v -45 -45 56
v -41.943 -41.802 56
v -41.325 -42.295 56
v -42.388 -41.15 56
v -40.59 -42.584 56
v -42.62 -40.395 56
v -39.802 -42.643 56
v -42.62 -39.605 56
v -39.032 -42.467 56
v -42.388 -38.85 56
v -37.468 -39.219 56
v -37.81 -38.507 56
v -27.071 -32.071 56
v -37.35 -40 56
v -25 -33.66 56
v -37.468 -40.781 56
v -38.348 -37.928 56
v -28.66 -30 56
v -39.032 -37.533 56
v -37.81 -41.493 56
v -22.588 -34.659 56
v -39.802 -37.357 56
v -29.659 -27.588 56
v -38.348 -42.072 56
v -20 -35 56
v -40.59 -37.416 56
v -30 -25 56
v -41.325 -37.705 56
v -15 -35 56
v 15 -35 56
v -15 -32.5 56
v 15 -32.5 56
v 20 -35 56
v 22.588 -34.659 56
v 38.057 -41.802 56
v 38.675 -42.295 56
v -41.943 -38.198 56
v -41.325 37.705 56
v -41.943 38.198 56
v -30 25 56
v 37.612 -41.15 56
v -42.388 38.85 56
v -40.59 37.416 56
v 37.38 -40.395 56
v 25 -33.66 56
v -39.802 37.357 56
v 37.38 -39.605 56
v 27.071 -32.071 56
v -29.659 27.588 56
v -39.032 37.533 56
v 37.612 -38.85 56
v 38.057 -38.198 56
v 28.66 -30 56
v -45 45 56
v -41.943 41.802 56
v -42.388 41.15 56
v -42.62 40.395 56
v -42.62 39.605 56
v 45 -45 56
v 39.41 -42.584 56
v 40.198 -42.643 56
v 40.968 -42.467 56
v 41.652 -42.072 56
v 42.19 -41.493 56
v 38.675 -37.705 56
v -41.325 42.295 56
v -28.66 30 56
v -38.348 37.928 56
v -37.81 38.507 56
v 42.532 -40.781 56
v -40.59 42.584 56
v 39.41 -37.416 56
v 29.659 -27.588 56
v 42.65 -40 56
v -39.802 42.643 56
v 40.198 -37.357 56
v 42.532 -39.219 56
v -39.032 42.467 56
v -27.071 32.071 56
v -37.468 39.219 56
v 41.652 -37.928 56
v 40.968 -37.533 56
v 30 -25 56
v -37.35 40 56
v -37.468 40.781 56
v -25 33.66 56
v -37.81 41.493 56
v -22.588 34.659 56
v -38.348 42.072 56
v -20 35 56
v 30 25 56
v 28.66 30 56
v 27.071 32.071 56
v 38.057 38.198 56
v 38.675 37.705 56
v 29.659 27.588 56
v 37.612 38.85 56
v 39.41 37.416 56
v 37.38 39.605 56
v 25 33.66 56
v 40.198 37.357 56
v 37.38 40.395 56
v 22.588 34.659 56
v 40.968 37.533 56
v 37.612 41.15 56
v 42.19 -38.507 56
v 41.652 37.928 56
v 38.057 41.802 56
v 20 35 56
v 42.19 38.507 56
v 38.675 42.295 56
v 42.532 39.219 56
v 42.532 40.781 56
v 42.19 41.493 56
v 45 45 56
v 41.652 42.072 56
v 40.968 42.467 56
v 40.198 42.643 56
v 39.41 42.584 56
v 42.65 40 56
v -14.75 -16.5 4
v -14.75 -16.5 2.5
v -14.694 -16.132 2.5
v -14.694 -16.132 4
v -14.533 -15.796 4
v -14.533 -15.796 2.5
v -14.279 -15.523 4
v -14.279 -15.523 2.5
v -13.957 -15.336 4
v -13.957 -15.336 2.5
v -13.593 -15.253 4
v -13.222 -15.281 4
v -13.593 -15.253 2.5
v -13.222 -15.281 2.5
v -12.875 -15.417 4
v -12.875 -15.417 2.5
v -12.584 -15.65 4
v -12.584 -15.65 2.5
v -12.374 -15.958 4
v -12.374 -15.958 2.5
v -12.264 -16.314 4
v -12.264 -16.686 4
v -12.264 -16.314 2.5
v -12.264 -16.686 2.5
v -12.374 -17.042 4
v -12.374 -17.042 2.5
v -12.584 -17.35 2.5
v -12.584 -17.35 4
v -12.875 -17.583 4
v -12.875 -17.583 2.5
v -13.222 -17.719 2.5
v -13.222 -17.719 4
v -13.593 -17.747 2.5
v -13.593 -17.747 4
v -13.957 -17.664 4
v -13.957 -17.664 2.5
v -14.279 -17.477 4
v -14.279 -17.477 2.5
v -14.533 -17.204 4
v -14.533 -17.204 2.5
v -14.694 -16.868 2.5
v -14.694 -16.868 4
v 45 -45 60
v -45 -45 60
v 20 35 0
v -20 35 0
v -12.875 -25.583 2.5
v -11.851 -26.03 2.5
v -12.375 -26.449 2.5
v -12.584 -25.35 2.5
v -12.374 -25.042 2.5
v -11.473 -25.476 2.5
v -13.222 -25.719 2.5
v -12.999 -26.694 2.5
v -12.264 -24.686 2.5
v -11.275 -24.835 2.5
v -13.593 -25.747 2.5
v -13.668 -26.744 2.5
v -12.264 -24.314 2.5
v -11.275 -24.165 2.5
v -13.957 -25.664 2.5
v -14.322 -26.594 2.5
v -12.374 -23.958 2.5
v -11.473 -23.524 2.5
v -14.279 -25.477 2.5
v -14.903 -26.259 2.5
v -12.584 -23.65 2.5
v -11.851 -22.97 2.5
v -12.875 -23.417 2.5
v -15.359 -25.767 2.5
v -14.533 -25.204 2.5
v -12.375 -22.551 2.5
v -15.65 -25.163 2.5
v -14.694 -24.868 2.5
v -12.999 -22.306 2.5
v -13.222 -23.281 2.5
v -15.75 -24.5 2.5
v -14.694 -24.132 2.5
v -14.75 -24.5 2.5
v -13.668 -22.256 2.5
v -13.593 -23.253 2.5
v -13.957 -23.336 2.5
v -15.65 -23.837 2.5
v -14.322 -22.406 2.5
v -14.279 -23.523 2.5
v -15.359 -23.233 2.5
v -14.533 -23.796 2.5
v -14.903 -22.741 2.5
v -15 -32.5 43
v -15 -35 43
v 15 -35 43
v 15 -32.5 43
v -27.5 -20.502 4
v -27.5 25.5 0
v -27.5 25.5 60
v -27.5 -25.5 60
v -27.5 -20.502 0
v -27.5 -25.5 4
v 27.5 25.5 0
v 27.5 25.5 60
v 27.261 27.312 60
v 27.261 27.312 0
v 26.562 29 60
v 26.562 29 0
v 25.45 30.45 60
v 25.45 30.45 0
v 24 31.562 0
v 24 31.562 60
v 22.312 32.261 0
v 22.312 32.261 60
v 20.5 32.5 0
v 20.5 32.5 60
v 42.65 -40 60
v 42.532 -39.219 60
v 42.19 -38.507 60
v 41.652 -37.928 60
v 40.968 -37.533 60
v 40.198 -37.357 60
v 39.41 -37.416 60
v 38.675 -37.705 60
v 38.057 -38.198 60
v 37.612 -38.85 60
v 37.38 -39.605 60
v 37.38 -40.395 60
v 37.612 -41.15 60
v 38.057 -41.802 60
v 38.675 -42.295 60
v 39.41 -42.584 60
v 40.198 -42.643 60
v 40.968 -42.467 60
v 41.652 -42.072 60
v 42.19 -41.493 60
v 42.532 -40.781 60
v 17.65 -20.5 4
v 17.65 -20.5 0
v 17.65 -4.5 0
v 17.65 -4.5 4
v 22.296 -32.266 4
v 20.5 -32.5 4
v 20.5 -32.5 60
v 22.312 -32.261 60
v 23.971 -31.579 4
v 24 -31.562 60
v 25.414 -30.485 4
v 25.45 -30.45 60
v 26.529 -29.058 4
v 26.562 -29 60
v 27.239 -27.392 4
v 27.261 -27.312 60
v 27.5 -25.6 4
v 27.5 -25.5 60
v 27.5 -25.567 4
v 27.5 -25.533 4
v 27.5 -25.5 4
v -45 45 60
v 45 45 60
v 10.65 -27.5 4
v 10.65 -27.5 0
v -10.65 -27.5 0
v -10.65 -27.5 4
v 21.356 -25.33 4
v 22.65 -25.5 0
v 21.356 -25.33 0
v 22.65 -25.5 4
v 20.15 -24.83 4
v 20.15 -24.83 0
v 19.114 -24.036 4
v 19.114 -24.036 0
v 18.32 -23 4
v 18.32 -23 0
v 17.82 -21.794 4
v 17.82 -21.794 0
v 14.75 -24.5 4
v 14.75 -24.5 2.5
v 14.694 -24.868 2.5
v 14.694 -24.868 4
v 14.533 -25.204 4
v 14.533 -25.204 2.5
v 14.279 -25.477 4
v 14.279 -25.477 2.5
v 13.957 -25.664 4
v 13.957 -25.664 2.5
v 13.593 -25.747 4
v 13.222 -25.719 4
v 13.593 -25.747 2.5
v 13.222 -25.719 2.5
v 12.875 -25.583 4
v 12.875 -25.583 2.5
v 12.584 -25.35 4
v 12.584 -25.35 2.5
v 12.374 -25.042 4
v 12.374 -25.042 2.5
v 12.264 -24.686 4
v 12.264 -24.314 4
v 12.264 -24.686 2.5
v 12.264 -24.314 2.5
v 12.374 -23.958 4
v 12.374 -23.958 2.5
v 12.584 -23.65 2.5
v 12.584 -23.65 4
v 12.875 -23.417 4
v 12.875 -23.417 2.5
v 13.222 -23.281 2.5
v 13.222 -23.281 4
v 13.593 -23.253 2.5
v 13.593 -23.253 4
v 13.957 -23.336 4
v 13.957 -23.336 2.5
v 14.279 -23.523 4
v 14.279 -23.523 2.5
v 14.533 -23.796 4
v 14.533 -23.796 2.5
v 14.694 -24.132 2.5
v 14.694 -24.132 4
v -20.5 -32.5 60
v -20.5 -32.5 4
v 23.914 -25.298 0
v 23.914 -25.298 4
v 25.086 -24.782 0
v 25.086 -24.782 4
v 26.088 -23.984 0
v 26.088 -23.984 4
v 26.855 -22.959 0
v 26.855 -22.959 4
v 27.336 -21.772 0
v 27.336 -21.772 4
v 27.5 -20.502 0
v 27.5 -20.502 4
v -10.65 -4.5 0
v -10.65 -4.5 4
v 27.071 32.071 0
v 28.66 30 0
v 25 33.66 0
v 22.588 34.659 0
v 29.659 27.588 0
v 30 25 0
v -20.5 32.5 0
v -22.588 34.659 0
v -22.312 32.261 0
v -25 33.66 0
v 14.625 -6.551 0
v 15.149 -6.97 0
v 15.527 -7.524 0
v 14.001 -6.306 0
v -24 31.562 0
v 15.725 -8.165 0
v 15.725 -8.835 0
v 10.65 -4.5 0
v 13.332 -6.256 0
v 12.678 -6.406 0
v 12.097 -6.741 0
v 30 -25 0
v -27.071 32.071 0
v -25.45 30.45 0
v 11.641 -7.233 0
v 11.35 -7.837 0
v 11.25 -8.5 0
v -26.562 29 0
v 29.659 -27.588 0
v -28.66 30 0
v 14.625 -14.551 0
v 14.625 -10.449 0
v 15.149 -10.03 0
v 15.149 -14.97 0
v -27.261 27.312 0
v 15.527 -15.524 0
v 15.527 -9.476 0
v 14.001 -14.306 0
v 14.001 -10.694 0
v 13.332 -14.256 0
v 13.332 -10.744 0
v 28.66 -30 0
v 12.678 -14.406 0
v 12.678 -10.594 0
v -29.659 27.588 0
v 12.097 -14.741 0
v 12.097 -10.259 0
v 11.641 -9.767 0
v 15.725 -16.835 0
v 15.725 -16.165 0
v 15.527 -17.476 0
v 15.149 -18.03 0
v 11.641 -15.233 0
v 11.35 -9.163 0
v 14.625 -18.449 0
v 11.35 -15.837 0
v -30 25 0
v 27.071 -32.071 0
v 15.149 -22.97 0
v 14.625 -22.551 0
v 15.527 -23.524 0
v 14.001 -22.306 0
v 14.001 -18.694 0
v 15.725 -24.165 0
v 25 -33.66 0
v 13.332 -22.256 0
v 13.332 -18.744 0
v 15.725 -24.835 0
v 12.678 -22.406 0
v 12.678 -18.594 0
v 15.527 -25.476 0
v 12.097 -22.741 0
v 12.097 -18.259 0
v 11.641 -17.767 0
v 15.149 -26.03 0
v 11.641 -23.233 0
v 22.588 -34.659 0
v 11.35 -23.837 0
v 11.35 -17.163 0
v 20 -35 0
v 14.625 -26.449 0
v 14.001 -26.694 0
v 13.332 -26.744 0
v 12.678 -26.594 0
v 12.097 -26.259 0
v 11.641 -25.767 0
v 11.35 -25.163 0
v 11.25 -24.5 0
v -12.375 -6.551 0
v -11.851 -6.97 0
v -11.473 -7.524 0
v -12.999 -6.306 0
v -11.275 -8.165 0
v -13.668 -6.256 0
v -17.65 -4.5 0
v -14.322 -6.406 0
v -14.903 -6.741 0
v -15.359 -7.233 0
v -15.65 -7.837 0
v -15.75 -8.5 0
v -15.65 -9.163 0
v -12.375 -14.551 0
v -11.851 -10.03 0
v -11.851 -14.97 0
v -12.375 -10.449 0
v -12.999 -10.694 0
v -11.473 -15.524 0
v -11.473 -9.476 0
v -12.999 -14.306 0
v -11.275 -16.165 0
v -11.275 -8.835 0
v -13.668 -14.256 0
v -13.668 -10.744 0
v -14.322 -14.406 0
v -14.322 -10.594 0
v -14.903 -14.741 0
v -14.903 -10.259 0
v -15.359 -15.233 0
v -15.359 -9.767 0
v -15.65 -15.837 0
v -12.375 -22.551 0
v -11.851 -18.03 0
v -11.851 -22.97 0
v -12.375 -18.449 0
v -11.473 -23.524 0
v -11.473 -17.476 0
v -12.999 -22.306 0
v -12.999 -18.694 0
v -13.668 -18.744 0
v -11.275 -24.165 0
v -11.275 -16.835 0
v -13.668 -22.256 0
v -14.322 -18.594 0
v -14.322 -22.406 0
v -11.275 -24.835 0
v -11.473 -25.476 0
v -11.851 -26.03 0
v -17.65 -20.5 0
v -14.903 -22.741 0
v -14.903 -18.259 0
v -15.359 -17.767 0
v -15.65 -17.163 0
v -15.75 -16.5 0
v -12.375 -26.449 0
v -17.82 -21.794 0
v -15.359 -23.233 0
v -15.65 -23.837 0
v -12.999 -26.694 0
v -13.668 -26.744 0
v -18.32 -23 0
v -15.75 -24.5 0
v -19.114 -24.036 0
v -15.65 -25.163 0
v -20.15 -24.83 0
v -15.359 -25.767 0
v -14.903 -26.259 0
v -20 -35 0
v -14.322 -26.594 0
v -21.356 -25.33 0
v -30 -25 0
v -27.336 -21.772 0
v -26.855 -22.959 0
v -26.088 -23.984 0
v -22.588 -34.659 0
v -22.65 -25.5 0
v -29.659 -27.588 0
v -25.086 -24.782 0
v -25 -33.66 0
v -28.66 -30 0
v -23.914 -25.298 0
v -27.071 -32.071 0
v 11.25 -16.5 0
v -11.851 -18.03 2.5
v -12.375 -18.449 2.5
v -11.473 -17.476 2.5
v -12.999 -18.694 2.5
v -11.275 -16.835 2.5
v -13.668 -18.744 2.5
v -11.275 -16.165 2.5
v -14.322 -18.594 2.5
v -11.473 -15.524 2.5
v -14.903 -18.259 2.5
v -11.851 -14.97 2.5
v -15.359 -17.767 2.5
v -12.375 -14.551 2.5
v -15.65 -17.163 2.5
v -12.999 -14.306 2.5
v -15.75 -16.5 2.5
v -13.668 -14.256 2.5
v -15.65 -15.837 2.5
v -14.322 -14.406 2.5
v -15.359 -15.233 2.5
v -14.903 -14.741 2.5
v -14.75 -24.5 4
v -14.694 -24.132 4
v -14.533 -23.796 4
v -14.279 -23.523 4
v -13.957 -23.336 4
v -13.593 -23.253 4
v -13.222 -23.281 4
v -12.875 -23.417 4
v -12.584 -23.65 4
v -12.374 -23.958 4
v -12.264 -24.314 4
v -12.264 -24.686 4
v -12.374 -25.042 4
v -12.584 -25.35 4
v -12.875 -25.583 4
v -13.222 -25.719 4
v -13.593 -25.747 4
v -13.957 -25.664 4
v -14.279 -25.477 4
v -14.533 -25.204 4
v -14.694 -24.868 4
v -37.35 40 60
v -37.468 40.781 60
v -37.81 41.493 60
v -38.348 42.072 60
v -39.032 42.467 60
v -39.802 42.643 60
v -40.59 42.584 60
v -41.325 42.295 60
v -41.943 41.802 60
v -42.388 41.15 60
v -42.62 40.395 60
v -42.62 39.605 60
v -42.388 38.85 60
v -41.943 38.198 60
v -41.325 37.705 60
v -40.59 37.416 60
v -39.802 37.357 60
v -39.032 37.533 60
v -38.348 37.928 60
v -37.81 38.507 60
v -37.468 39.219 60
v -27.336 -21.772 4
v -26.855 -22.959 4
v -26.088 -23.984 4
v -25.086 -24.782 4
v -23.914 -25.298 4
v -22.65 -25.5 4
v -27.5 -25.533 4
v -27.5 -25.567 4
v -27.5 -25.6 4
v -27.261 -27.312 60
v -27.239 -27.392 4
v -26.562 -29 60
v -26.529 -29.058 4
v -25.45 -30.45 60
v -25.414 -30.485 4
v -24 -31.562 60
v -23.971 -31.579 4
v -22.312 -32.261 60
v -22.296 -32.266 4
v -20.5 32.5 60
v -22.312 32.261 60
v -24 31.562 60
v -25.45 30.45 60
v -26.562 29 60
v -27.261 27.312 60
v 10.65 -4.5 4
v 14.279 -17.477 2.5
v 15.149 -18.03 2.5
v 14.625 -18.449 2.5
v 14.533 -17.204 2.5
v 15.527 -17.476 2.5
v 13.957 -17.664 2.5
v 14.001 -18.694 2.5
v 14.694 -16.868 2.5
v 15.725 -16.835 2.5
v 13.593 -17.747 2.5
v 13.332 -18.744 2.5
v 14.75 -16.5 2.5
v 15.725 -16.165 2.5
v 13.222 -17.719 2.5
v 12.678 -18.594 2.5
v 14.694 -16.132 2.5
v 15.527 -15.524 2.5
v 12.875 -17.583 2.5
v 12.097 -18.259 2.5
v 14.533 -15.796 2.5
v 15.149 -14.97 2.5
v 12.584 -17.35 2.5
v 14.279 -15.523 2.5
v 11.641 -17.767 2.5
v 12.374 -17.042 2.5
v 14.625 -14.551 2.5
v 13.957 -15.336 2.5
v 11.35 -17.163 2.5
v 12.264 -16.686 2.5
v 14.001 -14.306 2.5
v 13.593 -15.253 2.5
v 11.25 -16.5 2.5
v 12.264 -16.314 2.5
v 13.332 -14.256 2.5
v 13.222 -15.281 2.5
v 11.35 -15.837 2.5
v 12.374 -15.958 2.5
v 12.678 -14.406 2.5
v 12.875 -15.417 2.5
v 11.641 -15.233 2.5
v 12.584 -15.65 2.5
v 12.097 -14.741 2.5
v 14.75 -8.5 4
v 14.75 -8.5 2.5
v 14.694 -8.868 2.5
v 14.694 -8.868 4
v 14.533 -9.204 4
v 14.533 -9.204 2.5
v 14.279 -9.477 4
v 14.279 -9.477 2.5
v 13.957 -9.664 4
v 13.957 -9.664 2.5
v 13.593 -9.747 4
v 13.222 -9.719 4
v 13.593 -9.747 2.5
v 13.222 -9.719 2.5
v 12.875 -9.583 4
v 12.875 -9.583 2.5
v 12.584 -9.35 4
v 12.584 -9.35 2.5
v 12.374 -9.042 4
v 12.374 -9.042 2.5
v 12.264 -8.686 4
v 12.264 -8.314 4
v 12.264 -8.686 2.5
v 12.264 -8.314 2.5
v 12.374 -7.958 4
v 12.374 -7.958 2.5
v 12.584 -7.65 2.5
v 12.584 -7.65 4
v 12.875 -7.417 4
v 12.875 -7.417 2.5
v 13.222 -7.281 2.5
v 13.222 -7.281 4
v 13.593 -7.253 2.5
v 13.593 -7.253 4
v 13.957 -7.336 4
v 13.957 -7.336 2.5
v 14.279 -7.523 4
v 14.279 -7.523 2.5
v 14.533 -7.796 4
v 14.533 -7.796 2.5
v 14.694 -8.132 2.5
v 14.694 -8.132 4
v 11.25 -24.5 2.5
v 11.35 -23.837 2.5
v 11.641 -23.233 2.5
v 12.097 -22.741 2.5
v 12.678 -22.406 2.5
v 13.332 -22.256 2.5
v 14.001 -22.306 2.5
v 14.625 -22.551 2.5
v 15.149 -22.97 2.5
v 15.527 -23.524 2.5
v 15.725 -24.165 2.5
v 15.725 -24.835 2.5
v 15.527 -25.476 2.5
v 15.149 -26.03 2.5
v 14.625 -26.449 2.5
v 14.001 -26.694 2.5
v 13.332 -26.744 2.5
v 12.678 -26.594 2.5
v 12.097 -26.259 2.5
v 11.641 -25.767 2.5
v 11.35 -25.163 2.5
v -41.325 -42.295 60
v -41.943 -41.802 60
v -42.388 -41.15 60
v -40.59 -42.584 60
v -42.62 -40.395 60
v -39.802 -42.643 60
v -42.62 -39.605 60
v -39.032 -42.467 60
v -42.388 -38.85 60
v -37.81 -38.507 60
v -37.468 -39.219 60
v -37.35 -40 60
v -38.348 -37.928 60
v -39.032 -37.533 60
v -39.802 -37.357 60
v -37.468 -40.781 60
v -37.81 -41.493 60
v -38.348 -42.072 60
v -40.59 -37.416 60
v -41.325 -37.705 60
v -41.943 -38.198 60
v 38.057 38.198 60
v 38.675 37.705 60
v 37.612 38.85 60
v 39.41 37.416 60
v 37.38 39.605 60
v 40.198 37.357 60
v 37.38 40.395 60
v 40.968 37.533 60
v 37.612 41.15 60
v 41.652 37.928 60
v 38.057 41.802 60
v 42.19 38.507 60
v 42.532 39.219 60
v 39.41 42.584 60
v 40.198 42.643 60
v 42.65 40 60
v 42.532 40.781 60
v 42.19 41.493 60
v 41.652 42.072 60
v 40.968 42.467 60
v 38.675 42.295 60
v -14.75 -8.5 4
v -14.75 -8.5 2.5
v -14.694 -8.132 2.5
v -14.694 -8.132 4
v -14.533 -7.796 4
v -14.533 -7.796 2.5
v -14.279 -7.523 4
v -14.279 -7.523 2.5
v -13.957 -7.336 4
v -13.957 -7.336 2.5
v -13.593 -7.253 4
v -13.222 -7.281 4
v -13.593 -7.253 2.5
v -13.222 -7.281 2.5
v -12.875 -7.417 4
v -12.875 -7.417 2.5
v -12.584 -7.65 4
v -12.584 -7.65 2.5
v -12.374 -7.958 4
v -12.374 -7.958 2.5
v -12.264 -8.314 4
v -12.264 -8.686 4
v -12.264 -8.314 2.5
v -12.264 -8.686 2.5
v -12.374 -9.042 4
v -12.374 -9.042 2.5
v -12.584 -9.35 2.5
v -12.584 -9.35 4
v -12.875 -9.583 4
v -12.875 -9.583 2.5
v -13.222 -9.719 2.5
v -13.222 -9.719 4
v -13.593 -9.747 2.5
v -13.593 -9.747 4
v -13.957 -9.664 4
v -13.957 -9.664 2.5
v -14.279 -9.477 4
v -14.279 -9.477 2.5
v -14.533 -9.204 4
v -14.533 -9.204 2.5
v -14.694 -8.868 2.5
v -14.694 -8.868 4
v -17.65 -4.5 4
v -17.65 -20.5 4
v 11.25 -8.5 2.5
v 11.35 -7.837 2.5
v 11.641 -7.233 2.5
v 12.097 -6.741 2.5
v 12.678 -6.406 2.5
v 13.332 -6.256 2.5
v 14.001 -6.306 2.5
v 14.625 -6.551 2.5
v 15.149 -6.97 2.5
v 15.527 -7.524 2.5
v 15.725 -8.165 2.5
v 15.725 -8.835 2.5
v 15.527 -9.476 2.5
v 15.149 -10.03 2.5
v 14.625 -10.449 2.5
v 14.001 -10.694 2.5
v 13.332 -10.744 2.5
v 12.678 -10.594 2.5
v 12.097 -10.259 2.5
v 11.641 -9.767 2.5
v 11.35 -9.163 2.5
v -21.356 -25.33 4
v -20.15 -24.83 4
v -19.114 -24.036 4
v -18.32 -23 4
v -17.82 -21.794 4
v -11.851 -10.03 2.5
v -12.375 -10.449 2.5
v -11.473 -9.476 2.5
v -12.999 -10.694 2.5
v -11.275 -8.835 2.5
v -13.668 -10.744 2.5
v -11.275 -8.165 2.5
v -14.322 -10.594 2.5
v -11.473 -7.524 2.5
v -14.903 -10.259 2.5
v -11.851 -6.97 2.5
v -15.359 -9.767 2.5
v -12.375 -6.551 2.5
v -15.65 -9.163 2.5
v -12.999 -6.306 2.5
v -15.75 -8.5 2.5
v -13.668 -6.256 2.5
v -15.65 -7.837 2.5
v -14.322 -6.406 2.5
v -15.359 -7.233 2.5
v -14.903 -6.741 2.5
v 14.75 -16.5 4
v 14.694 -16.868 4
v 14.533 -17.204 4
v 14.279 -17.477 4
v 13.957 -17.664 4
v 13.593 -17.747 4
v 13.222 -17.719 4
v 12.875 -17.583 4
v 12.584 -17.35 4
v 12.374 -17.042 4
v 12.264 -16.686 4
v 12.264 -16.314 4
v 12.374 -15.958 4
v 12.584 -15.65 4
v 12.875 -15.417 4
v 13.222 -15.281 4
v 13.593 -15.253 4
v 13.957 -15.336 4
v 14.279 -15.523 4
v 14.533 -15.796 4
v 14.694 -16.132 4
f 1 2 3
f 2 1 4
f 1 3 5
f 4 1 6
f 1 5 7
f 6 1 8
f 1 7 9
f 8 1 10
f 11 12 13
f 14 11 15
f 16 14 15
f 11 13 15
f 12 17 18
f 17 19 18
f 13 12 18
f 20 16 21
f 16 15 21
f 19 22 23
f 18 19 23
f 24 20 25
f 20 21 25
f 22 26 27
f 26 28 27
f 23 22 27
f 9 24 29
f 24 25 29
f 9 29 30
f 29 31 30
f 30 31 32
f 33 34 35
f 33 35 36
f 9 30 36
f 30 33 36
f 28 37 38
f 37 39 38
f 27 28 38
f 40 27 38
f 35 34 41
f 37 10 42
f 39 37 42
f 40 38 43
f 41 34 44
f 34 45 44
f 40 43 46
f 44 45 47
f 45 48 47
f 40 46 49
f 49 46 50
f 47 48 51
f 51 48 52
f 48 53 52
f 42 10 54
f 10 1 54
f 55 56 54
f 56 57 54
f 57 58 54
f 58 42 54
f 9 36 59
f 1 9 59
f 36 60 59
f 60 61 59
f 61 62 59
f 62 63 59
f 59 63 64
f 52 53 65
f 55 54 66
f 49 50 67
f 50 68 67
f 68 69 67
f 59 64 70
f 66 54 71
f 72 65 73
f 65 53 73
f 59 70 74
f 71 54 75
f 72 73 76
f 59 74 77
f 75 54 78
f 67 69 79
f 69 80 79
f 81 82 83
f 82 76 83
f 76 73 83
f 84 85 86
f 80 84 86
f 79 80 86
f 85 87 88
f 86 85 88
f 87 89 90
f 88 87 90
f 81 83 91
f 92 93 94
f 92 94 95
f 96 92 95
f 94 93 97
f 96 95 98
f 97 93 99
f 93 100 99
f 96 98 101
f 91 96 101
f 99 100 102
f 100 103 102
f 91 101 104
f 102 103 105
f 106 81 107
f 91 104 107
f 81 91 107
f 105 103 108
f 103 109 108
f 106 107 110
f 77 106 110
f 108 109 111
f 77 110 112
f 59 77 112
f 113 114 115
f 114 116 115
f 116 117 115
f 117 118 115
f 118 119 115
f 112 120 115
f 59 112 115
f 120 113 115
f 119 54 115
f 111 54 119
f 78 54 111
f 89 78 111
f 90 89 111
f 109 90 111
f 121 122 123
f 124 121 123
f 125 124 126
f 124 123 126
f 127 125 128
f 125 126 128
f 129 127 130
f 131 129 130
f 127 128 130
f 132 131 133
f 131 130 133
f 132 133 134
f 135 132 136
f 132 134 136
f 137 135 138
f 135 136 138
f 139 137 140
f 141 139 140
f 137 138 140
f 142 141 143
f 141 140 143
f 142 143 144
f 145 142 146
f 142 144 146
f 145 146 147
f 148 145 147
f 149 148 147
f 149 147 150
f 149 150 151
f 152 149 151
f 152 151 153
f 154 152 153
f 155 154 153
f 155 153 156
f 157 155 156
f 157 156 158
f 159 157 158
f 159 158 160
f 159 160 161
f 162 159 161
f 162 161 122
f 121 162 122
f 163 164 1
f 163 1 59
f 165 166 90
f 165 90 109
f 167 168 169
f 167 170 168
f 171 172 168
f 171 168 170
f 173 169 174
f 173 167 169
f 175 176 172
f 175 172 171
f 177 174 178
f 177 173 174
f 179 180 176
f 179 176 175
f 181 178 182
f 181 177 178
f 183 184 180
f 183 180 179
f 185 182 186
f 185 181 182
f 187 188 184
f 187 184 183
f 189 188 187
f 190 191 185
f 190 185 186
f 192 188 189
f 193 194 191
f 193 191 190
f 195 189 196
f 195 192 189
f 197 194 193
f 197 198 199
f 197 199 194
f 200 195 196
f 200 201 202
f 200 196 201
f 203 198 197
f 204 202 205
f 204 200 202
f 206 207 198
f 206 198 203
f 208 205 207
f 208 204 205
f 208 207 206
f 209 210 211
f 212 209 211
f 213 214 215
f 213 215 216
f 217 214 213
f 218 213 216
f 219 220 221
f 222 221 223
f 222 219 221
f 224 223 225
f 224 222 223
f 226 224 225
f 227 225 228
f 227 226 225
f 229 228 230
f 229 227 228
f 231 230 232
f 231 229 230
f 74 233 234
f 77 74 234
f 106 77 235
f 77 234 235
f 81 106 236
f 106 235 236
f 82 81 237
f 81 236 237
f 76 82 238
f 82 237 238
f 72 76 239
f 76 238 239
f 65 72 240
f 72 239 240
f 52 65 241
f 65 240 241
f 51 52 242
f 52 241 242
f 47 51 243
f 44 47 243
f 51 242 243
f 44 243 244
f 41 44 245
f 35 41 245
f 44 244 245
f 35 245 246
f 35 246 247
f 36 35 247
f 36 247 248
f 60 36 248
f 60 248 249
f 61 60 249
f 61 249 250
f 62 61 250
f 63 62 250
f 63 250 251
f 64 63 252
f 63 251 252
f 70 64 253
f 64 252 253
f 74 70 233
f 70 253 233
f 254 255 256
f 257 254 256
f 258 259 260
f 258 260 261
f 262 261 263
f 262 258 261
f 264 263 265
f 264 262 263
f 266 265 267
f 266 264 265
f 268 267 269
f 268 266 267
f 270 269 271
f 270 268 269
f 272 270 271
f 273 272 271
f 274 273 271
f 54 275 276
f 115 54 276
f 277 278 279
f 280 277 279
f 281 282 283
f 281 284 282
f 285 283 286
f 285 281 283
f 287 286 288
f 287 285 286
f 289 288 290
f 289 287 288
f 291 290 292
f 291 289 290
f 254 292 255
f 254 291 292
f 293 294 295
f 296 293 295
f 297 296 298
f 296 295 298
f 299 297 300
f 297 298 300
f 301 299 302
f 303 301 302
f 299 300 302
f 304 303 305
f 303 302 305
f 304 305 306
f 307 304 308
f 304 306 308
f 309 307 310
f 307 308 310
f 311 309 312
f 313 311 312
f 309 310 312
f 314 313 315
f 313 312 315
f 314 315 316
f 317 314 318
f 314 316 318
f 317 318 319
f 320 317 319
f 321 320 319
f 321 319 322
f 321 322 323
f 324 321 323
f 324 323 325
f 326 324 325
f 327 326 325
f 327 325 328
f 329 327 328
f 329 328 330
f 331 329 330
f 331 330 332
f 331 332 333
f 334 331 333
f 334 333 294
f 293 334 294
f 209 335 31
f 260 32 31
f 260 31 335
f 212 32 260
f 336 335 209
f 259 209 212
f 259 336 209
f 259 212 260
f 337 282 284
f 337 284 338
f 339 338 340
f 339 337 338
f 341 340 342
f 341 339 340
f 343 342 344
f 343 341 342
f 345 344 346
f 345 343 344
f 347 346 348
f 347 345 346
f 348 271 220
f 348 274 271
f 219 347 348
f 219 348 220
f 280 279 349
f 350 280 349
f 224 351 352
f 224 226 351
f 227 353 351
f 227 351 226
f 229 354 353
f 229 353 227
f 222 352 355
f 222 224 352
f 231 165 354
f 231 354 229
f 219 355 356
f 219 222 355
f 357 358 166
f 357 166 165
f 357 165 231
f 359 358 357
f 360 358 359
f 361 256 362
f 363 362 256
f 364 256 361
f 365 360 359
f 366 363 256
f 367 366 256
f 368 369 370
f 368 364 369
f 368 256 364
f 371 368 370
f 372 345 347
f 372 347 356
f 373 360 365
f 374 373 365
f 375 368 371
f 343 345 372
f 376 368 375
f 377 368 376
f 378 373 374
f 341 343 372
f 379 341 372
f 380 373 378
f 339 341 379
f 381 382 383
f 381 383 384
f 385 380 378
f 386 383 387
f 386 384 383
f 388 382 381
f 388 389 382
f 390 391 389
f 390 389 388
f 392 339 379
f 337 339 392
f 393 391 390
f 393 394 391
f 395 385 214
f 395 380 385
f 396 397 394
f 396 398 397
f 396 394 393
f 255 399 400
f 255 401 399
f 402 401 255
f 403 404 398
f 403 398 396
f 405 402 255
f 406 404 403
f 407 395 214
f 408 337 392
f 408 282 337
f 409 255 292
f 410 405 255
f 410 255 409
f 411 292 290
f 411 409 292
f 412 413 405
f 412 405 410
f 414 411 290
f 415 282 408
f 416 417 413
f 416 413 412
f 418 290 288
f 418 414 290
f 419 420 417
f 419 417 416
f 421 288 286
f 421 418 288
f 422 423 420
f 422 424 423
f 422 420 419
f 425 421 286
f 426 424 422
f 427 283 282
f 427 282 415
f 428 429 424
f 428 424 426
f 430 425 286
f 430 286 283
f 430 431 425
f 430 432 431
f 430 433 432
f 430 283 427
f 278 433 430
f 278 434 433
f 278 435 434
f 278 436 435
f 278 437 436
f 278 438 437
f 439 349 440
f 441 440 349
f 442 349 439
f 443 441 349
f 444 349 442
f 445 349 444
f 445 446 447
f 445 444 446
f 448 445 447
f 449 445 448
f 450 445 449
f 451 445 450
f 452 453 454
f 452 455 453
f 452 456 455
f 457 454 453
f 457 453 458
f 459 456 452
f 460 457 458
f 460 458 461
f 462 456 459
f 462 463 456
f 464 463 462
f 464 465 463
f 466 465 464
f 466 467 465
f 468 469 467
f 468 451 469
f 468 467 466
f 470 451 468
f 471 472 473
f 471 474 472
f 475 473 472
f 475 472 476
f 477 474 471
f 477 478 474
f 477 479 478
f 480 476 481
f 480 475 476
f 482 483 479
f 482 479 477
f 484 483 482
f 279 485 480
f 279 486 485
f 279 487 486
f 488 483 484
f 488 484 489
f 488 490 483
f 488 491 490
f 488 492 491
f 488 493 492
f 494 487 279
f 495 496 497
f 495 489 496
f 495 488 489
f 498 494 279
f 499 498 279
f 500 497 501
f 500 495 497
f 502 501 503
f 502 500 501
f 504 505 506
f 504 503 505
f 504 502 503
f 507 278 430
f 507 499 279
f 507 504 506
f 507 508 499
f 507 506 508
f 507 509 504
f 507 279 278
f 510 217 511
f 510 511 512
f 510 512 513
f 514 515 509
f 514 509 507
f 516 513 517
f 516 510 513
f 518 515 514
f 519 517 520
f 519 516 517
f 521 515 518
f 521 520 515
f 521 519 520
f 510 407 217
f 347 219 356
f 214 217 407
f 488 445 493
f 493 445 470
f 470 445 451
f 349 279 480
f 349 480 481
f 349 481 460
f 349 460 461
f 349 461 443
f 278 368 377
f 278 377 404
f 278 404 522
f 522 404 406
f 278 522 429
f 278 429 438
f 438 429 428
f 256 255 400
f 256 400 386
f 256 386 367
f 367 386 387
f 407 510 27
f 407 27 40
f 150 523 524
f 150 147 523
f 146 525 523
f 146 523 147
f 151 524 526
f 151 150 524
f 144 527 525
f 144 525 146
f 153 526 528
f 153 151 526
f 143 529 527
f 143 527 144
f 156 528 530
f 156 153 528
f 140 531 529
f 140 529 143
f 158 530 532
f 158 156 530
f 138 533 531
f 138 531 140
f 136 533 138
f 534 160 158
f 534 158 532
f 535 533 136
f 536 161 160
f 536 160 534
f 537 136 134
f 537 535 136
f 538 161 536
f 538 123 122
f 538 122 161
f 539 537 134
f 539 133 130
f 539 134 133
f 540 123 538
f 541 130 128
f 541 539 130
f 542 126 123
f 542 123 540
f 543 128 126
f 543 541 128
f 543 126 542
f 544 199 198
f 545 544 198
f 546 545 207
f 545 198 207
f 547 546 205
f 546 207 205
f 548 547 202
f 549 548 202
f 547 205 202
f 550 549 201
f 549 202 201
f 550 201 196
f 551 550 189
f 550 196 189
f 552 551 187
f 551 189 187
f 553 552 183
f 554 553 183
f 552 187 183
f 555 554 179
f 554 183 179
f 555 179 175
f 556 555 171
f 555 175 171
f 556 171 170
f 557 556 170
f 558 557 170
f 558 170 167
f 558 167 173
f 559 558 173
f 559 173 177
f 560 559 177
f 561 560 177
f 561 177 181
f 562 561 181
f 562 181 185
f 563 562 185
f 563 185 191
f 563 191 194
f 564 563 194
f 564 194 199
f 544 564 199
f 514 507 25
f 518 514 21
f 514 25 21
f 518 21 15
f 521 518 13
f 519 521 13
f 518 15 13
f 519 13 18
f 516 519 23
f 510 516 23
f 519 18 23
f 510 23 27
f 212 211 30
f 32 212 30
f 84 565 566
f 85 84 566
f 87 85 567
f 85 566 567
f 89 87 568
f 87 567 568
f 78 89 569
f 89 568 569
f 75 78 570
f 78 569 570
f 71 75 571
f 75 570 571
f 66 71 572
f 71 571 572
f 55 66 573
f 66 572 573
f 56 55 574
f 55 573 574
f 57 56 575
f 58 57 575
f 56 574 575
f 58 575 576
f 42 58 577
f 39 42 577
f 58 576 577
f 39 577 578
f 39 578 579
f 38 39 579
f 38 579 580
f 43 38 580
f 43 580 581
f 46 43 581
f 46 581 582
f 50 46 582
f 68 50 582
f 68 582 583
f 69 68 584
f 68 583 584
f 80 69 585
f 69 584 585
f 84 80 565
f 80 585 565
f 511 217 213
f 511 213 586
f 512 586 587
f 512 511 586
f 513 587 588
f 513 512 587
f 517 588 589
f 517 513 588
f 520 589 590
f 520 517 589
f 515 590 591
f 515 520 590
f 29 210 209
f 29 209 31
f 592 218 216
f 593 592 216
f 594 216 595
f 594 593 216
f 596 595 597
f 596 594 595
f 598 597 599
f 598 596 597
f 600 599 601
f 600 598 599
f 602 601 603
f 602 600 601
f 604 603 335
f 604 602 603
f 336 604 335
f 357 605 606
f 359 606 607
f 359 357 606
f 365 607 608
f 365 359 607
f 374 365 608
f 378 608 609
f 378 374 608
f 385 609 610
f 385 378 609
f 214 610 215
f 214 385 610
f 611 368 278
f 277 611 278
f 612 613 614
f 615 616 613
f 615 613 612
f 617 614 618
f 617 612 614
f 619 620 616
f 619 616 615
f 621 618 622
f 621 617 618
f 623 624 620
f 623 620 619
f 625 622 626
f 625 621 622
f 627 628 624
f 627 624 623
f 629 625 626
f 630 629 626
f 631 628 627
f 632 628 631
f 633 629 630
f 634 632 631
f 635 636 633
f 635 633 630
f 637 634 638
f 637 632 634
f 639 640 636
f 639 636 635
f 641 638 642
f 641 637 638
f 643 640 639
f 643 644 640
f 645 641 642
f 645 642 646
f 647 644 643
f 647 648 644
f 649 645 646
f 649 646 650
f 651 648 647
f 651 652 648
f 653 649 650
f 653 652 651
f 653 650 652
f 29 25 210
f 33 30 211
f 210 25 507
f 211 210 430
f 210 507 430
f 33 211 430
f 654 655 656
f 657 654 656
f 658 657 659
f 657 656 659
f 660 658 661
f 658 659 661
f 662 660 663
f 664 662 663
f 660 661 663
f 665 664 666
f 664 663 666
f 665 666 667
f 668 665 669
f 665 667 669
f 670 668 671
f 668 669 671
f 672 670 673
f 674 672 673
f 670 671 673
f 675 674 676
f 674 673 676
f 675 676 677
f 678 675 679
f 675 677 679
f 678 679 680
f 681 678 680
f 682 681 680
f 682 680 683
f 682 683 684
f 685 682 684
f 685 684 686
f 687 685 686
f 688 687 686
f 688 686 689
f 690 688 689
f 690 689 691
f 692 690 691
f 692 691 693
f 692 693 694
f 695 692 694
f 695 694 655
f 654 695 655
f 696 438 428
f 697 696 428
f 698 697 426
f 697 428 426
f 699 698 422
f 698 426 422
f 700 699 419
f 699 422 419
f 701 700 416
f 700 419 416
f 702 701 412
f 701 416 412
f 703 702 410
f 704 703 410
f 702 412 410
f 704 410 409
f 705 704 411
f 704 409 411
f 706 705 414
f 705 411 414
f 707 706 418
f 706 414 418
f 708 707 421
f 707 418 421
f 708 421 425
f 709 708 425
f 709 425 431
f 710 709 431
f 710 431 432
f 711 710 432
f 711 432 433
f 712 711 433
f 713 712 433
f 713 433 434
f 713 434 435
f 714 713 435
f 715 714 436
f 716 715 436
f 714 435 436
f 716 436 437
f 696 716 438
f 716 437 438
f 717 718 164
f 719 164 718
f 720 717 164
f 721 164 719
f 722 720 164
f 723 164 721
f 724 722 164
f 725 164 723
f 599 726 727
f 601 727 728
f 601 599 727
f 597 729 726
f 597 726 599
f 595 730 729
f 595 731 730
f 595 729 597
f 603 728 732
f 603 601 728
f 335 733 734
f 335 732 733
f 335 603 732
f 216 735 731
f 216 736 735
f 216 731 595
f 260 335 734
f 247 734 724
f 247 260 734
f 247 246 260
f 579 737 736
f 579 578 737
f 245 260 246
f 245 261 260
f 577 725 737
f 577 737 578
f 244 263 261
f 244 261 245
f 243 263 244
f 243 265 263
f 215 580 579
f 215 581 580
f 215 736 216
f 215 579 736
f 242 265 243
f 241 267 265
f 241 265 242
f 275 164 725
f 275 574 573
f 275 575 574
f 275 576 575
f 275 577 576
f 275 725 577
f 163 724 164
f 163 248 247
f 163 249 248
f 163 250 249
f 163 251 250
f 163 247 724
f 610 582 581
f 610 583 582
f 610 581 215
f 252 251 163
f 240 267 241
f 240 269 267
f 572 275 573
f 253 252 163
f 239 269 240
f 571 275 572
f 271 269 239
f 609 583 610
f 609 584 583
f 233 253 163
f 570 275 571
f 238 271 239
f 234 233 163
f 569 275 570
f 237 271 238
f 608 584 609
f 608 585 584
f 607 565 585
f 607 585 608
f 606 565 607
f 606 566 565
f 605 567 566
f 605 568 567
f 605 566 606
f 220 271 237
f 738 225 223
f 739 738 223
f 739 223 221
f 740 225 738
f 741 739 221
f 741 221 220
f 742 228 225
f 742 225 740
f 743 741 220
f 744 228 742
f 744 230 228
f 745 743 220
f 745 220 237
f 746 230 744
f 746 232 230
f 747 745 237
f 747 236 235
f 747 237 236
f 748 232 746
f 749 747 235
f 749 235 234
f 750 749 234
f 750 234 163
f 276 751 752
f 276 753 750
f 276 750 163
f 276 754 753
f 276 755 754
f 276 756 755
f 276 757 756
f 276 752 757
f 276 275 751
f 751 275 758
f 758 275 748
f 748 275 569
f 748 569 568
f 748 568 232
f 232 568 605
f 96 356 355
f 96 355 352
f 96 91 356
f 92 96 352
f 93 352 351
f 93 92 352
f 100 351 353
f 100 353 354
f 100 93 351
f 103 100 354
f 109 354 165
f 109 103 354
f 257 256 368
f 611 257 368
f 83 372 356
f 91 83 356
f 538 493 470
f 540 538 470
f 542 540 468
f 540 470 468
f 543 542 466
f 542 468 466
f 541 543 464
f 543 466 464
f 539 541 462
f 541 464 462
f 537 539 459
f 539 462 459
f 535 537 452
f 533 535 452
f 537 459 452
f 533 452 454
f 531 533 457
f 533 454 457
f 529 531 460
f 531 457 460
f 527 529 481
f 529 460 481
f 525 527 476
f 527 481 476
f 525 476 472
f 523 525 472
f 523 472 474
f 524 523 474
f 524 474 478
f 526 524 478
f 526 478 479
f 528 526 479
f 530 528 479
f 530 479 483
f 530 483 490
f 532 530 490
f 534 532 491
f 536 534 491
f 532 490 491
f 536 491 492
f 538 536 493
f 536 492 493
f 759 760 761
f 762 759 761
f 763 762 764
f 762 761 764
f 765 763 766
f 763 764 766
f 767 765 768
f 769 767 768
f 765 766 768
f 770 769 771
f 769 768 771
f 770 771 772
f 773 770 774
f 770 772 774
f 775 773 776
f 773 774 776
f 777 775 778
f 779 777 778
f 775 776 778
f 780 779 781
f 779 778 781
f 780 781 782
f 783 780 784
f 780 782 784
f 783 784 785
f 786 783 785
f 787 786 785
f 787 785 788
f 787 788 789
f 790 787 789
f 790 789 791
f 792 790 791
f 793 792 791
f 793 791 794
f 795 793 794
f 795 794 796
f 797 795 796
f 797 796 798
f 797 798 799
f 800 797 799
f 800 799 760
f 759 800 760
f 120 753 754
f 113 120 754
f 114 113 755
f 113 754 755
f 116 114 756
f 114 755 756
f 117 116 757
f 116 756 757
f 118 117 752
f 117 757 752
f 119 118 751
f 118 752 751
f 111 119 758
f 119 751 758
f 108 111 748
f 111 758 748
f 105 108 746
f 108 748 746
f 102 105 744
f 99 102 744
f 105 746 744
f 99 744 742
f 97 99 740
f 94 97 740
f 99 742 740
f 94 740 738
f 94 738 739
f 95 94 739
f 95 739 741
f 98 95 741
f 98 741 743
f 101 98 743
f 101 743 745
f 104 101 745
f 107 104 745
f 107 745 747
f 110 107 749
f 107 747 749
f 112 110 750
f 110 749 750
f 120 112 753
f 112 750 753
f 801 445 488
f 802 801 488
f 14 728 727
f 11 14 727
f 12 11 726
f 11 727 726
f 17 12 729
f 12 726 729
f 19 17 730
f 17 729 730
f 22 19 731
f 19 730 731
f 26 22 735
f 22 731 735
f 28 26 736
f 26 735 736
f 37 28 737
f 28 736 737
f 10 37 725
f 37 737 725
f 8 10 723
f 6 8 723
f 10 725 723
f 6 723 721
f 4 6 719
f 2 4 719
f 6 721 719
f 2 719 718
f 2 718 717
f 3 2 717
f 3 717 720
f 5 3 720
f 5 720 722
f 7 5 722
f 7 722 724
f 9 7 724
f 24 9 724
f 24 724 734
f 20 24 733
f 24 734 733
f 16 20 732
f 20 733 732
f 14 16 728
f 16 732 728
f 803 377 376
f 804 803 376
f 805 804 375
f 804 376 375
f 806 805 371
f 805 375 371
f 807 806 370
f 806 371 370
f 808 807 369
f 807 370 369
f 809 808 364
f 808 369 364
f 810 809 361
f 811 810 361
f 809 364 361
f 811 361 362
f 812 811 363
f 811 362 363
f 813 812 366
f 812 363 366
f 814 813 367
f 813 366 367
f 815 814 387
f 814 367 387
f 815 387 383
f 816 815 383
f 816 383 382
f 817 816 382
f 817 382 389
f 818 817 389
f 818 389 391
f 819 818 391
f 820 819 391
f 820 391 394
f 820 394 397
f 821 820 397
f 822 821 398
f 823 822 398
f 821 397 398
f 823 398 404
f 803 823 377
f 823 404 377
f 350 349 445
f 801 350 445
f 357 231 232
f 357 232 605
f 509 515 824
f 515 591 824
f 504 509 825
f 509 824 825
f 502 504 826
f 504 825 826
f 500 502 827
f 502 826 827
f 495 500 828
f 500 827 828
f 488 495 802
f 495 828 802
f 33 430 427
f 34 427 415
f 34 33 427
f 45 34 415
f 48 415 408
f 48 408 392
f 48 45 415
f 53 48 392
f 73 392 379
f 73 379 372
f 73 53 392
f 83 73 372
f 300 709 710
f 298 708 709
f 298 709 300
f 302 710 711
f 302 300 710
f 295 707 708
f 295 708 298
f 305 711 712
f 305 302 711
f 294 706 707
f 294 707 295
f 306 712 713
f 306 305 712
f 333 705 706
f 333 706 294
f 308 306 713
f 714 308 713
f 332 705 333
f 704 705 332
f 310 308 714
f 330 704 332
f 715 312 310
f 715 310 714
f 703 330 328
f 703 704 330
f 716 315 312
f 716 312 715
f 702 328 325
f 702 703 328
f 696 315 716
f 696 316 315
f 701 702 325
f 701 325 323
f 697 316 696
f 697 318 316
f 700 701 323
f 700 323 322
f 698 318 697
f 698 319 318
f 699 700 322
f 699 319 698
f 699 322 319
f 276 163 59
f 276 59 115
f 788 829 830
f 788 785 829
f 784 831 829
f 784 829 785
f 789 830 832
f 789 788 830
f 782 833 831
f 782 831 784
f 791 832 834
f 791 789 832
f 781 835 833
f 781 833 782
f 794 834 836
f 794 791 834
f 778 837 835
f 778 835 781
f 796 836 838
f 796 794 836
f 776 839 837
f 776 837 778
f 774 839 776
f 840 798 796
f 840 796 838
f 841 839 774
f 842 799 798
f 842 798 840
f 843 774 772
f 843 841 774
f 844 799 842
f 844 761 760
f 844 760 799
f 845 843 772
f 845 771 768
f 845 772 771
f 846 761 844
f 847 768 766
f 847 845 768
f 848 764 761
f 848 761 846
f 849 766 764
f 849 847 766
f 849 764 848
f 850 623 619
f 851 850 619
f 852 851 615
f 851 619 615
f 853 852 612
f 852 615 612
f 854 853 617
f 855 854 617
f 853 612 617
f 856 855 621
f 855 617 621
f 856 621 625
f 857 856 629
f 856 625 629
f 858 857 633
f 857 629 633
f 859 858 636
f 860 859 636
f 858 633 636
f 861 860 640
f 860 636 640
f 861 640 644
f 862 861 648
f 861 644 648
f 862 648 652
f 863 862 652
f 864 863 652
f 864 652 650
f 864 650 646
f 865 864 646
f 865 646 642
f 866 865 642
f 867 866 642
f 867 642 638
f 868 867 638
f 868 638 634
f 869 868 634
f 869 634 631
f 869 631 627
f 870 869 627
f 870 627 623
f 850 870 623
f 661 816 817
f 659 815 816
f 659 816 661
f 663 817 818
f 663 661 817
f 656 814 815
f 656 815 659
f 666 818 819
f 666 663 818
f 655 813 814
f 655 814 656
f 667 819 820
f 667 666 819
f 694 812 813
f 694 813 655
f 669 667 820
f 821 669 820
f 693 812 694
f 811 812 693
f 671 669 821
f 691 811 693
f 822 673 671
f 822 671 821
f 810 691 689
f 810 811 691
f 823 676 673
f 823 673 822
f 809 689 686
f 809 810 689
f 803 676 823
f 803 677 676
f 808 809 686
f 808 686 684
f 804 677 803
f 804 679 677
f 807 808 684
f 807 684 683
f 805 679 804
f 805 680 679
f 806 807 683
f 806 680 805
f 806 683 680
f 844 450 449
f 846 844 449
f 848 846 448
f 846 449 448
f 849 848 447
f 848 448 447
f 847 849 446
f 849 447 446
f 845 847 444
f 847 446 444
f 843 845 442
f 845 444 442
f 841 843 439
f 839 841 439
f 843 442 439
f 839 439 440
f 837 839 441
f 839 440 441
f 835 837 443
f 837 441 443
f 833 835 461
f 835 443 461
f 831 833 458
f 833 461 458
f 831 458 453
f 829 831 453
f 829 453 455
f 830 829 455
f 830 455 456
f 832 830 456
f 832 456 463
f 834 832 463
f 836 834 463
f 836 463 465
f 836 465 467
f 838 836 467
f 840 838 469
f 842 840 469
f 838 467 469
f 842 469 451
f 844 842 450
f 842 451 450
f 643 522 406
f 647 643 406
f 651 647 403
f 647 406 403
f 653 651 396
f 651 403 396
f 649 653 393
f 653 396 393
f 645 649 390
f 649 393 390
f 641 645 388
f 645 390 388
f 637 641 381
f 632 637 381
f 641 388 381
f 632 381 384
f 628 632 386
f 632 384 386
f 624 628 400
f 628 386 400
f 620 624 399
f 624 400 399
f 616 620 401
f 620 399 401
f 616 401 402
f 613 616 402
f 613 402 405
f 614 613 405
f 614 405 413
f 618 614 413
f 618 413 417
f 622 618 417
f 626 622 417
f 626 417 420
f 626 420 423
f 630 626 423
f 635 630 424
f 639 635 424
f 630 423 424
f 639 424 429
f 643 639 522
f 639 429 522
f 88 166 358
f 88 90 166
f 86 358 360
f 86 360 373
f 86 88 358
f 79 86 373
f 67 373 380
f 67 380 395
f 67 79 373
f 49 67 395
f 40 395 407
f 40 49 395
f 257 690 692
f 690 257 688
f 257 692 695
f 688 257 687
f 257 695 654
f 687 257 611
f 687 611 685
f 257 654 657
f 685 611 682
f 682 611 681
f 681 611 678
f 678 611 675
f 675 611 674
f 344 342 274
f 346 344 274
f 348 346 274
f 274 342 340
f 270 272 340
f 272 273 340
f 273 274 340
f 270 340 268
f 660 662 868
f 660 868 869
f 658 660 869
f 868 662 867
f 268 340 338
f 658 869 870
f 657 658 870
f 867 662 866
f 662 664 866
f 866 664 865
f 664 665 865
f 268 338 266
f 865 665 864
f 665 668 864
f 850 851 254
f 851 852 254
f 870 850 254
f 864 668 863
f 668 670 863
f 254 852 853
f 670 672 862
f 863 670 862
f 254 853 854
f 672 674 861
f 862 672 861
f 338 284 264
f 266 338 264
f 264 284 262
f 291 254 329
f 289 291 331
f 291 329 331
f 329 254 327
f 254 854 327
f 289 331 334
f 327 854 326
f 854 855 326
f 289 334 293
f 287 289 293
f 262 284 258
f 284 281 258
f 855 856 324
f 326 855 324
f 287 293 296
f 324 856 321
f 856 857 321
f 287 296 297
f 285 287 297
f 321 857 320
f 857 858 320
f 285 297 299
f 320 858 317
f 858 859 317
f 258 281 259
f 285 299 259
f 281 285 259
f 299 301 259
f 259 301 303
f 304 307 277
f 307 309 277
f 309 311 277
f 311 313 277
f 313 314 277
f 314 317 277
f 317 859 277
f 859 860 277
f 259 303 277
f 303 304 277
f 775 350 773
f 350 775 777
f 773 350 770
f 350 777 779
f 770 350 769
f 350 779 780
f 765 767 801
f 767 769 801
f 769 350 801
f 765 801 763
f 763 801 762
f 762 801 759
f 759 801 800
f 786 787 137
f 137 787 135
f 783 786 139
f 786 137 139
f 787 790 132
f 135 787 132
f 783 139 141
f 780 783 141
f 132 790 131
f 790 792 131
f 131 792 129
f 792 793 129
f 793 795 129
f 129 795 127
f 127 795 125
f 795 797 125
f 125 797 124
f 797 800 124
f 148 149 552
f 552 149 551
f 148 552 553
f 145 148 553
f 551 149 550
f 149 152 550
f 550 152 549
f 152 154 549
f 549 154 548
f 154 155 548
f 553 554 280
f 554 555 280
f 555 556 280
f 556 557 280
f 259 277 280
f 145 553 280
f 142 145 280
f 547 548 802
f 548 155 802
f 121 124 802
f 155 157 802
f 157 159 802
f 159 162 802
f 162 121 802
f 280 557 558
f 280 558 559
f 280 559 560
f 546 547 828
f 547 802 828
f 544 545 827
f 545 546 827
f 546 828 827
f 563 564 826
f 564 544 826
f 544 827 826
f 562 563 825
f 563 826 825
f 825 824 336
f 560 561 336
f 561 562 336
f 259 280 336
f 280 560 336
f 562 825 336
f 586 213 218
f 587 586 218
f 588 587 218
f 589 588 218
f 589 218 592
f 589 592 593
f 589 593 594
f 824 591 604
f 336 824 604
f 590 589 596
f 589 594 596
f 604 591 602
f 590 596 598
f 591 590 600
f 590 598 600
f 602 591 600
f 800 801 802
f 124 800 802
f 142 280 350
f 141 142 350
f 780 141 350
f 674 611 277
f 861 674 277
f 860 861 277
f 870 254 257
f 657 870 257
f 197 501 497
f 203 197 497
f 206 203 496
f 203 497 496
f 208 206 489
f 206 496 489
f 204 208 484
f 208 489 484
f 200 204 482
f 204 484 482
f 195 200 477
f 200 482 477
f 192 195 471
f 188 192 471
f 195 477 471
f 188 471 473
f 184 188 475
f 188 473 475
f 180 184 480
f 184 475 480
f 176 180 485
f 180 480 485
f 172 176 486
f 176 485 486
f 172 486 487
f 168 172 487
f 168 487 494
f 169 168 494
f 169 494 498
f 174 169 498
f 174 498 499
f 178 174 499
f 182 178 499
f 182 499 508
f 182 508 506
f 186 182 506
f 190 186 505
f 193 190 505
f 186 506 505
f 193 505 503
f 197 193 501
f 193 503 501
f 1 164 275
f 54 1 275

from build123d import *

# Parameters (mm, degrees)
SKETCH1_W           = 60
SKETCH1_H           = 70
BOSS_EXTRUDE1_DEPTH = 60
SKETCH2_R           = 1.25
BOSS_EXTRUDE2_DEPTH = 4
SKETCH4_W           = 30
SKETCH4_H           = 17
CUT_EXTRUDE1_DEPTH  = 2.5
SKETCH5_R           = 2.25
CUT_EXTRUDE2_DEPTH  = 2.5
SKETCH6_W           = 90
SKETCH6_H           = 90
SKETCH6_R           = 2.65
BOSS_EXTRUDE3_DEPTH = 4
FILLET1_R           = 10
CUT_EXTRUDE5_DEPTH  = 85.77027781
FILLET3_R           = 5
FILLET4_R           = 5


with BuildPart() as part:
    # Sketch1 → Boss-Extrude1 (new body)
    with BuildSketch(Plane.XY):
        Rectangle(SKETCH1_W, SKETCH1_H)
        with BuildLine():
            Line((20.5, -32.5), (-20.5, -32.5))
            ThreePointArc((-20.5, -32.5), (-25.449747468, -30.449747468), (-27.5, -25.5))
            Line((-27.5, -25.5), (-27.5, 25.5))
            ThreePointArc((-27.5, 25.5), (-25.449747468, 30.449747468), (-20.5, 32.5))
            Line((-20.5, 32.5), (20.5, 32.5))
            ThreePointArc((20.5, 32.5), (25.449747468, 30.449747468), (27.5, 25.5))
            Line((27.5, 25.5), (27.5, -25.5))
            ThreePointArc((27.5, -25.5), (25.449747468, -30.449747468), (20.5, -32.5))
        make_face(mode=Mode.SUBTRACT)
    extrude(amount=BOSS_EXTRUDE1_DEPTH)

    # Sketch2 → Boss-Extrude2 (add)
    with BuildSketch(Plane(origin=(0, 0, 0), x_dir=(-1, 0, 0), z_dir=(0, 0, -1))):
        with BuildLine():
            Line((-17.65, -4.5), (-10.65, -4.5))
            Line((-10.65, -4.5), (-10.65, -27.5))
            Line((-10.65, -27.5), (10.65, -27.5))
            Line((10.65, -27.5), (10.65, -4.5))
            Line((10.65, -4.5), (17.65, -4.5))
            Line((17.65, -4.5), (17.65, -25.5))
            Line((17.65, -25.5), (27.5, -25.5))
            ThreePointArc((27.5, -25.5), (25.449747468, -30.449747468), (20.5, -32.5))
            Line((20.5, -32.5), (-20.5, -32.5))
            ThreePointArc((-20.5, -32.5), (-25.449747468, -30.449747468), (-27.5, -25.5))
            Line((-27.5, -25.5), (-17.65, -25.5))
            Line((-17.65, -25.5), (-17.65, -4.5))
        make_face()
        with Locations((13.5, -8.5)):
            Circle(SKETCH2_R, mode=Mode.SUBTRACT)
        with Locations((13.5, -16.5)):
            Circle(SKETCH2_R, mode=Mode.SUBTRACT)
        with Locations((13.5, -24.5)):
            Circle(SKETCH2_R, mode=Mode.SUBTRACT)
        with Locations(Location((-13.5, -8.5, 0), (0, 0, 180))):
            Circle(SKETCH2_R, mode=Mode.SUBTRACT)
        with Locations(Location((-13.5, -16.5, 0), (0, 0, 180))):
            Circle(SKETCH2_R, mode=Mode.SUBTRACT)
        with Locations(Location((-13.5, -24.5, 0), (0, 0, 180))):
            Circle(SKETCH2_R, mode=Mode.SUBTRACT)
    extrude(amount=-BOSS_EXTRUDE2_DEPTH)

    # Sketch4 → Cut-Extrude1 (cut)
    with BuildSketch(Plane.XZ.offset(35)):
        with Locations((0, 51.5)):
            Rectangle(SKETCH4_W, SKETCH4_H)
    extrude(amount=-CUT_EXTRUDE1_DEPTH, mode=Mode.SUBTRACT)

    # Sketch5 → Cut-Extrude2 (cut)
    with BuildSketch(Plane(origin=(0, 0, 0), x_dir=(-1, 0, 0), z_dir=(0, 0, -1))):
        with Locations((-13.5, -8.5)):
            Circle(SKETCH5_R)
        with Locations((-13.5, -16.5)):
            Circle(SKETCH5_R)
        with Locations((-13.5, -24.5)):
            Circle(SKETCH5_R)
        with Locations((13.5, -24.5)):
            Circle(SKETCH5_R)
        with Locations((13.5, -16.5)):
            Circle(SKETCH5_R)
        with Locations((13.5, -8.5)):
            Circle(SKETCH5_R)
    extrude(amount=-CUT_EXTRUDE2_DEPTH, mode=Mode.SUBTRACT)

    # Sketch6 → Boss-Extrude3 (add)
    with BuildSketch(Plane.XY.offset(60)):
        Rectangle(SKETCH6_W, SKETCH6_H)
        with Locations((40, 40)):
            Circle(SKETCH6_R, mode=Mode.SUBTRACT)
        with Locations((-40, 40)):
            Circle(SKETCH6_R, mode=Mode.SUBTRACT)
        with Locations((-40, -40)):
            Circle(SKETCH6_R, mode=Mode.SUBTRACT)
        with Locations((40, -40)):
            Circle(SKETCH6_R, mode=Mode.SUBTRACT)
    extrude(amount=-BOSS_EXTRUDE3_DEPTH)

    # Fillet1
    fillet1_edges = [part.edges().sort_by_distance(p)[0] for p in [
        (-30, -35, 28),
        (30, -35, 28),
        (-30, 35, 28),
        (30, 35, 28),
    ]]
    fillet(fillet1_edges, radius=FILLET1_R)

    # Sketch8 → Cut-Extrude5 (cut, through all)
    with BuildSketch(Plane(origin=(0, 0, 56), x_dir=(-1, 0, 0), z_dir=(0, 0, -1))):
        with BuildLine():
            Line((-20.5, 32.5), (20.5, 32.5))
            ThreePointArc((20.5, 32.5), (25.449747468, 30.449747468), (27.5, 25.5))
            Line((27.5, 25.5), (27.5, -25.5))
            ThreePointArc((27.5, -25.5), (25.449747468, -30.449747468), (20.5, -32.5))
            Line((20.5, -32.5), (-20.5, -32.5))
            ThreePointArc((-20.5, -32.5), (-25.449747468, -30.449747468), (-27.5, -25.5))
            Line((-27.5, -25.5), (-27.5, 25.5))
            ThreePointArc((-27.5, 25.5), (-25.449747468, 30.449747468), (-20.5, 32.5))
        make_face()
    extrude(amount=-CUT_EXTRUDE5_DEPTH, mode=Mode.SUBTRACT)

    # Fillet3
    fillet3_edges = [part.edges().sort_by_distance(p)[0] for p in [
        (17.65, -25.5, 2),
        (-17.65, -25.5, 2),
    ]]
    fillet(fillet3_edges, radius=FILLET3_R)

    # Fillet4
    # the kernel refuses this fillet: 5 mm, written as the material it adds along each edge
    with BuildSketch(Plane(origin=(-27.5, -25.5, 0), x_dir=(1, 0, 0), z_dir=(0, 0, 1))) as fillet4_piece_1:
        with BuildLine():
            CenterArc((5, 4.997749494), FILLET4_R, 180, 88.280868679)
            Line((0, 4.997749494), (-0.1, 4.997749494))
            Line((-0.1, 4.997749494), (-0.1, 0))
            Line((-0.1, 0), (0, -0.1))
            ThreePointArc((0, -0.1), (2.425, -0.1), (4.847, -0.09995499))
            Line((4.847, -0.09995499), (4.85, 0))
        make_face()
    extrude(amount=4)
    with BuildSketch(Plane(origin=(27.5, -25.5, 0), x_dir=(0, 1, 0), z_dir=(0, 0, 1))) as fillet4_piece_2:
        with BuildLine():
            CenterArc((4.997749494, 5), FILLET4_R, 181.719131321, 88.280868679)
            Line((0, 4.85), (-0.09995499, 4.847))
            ThreePointArc((-0.09995499, 4.847), (-0.1, 2.425), (-0.1, 0))
            Line((-0.1, 0), (0, -0.1))
            Line((0, -0.1), (4.997749494, -0.1))
            Line((4.997749494, -0.1), (4.997749494, 0))
        make_face()
    extrude(amount=4)


solid = part.part
